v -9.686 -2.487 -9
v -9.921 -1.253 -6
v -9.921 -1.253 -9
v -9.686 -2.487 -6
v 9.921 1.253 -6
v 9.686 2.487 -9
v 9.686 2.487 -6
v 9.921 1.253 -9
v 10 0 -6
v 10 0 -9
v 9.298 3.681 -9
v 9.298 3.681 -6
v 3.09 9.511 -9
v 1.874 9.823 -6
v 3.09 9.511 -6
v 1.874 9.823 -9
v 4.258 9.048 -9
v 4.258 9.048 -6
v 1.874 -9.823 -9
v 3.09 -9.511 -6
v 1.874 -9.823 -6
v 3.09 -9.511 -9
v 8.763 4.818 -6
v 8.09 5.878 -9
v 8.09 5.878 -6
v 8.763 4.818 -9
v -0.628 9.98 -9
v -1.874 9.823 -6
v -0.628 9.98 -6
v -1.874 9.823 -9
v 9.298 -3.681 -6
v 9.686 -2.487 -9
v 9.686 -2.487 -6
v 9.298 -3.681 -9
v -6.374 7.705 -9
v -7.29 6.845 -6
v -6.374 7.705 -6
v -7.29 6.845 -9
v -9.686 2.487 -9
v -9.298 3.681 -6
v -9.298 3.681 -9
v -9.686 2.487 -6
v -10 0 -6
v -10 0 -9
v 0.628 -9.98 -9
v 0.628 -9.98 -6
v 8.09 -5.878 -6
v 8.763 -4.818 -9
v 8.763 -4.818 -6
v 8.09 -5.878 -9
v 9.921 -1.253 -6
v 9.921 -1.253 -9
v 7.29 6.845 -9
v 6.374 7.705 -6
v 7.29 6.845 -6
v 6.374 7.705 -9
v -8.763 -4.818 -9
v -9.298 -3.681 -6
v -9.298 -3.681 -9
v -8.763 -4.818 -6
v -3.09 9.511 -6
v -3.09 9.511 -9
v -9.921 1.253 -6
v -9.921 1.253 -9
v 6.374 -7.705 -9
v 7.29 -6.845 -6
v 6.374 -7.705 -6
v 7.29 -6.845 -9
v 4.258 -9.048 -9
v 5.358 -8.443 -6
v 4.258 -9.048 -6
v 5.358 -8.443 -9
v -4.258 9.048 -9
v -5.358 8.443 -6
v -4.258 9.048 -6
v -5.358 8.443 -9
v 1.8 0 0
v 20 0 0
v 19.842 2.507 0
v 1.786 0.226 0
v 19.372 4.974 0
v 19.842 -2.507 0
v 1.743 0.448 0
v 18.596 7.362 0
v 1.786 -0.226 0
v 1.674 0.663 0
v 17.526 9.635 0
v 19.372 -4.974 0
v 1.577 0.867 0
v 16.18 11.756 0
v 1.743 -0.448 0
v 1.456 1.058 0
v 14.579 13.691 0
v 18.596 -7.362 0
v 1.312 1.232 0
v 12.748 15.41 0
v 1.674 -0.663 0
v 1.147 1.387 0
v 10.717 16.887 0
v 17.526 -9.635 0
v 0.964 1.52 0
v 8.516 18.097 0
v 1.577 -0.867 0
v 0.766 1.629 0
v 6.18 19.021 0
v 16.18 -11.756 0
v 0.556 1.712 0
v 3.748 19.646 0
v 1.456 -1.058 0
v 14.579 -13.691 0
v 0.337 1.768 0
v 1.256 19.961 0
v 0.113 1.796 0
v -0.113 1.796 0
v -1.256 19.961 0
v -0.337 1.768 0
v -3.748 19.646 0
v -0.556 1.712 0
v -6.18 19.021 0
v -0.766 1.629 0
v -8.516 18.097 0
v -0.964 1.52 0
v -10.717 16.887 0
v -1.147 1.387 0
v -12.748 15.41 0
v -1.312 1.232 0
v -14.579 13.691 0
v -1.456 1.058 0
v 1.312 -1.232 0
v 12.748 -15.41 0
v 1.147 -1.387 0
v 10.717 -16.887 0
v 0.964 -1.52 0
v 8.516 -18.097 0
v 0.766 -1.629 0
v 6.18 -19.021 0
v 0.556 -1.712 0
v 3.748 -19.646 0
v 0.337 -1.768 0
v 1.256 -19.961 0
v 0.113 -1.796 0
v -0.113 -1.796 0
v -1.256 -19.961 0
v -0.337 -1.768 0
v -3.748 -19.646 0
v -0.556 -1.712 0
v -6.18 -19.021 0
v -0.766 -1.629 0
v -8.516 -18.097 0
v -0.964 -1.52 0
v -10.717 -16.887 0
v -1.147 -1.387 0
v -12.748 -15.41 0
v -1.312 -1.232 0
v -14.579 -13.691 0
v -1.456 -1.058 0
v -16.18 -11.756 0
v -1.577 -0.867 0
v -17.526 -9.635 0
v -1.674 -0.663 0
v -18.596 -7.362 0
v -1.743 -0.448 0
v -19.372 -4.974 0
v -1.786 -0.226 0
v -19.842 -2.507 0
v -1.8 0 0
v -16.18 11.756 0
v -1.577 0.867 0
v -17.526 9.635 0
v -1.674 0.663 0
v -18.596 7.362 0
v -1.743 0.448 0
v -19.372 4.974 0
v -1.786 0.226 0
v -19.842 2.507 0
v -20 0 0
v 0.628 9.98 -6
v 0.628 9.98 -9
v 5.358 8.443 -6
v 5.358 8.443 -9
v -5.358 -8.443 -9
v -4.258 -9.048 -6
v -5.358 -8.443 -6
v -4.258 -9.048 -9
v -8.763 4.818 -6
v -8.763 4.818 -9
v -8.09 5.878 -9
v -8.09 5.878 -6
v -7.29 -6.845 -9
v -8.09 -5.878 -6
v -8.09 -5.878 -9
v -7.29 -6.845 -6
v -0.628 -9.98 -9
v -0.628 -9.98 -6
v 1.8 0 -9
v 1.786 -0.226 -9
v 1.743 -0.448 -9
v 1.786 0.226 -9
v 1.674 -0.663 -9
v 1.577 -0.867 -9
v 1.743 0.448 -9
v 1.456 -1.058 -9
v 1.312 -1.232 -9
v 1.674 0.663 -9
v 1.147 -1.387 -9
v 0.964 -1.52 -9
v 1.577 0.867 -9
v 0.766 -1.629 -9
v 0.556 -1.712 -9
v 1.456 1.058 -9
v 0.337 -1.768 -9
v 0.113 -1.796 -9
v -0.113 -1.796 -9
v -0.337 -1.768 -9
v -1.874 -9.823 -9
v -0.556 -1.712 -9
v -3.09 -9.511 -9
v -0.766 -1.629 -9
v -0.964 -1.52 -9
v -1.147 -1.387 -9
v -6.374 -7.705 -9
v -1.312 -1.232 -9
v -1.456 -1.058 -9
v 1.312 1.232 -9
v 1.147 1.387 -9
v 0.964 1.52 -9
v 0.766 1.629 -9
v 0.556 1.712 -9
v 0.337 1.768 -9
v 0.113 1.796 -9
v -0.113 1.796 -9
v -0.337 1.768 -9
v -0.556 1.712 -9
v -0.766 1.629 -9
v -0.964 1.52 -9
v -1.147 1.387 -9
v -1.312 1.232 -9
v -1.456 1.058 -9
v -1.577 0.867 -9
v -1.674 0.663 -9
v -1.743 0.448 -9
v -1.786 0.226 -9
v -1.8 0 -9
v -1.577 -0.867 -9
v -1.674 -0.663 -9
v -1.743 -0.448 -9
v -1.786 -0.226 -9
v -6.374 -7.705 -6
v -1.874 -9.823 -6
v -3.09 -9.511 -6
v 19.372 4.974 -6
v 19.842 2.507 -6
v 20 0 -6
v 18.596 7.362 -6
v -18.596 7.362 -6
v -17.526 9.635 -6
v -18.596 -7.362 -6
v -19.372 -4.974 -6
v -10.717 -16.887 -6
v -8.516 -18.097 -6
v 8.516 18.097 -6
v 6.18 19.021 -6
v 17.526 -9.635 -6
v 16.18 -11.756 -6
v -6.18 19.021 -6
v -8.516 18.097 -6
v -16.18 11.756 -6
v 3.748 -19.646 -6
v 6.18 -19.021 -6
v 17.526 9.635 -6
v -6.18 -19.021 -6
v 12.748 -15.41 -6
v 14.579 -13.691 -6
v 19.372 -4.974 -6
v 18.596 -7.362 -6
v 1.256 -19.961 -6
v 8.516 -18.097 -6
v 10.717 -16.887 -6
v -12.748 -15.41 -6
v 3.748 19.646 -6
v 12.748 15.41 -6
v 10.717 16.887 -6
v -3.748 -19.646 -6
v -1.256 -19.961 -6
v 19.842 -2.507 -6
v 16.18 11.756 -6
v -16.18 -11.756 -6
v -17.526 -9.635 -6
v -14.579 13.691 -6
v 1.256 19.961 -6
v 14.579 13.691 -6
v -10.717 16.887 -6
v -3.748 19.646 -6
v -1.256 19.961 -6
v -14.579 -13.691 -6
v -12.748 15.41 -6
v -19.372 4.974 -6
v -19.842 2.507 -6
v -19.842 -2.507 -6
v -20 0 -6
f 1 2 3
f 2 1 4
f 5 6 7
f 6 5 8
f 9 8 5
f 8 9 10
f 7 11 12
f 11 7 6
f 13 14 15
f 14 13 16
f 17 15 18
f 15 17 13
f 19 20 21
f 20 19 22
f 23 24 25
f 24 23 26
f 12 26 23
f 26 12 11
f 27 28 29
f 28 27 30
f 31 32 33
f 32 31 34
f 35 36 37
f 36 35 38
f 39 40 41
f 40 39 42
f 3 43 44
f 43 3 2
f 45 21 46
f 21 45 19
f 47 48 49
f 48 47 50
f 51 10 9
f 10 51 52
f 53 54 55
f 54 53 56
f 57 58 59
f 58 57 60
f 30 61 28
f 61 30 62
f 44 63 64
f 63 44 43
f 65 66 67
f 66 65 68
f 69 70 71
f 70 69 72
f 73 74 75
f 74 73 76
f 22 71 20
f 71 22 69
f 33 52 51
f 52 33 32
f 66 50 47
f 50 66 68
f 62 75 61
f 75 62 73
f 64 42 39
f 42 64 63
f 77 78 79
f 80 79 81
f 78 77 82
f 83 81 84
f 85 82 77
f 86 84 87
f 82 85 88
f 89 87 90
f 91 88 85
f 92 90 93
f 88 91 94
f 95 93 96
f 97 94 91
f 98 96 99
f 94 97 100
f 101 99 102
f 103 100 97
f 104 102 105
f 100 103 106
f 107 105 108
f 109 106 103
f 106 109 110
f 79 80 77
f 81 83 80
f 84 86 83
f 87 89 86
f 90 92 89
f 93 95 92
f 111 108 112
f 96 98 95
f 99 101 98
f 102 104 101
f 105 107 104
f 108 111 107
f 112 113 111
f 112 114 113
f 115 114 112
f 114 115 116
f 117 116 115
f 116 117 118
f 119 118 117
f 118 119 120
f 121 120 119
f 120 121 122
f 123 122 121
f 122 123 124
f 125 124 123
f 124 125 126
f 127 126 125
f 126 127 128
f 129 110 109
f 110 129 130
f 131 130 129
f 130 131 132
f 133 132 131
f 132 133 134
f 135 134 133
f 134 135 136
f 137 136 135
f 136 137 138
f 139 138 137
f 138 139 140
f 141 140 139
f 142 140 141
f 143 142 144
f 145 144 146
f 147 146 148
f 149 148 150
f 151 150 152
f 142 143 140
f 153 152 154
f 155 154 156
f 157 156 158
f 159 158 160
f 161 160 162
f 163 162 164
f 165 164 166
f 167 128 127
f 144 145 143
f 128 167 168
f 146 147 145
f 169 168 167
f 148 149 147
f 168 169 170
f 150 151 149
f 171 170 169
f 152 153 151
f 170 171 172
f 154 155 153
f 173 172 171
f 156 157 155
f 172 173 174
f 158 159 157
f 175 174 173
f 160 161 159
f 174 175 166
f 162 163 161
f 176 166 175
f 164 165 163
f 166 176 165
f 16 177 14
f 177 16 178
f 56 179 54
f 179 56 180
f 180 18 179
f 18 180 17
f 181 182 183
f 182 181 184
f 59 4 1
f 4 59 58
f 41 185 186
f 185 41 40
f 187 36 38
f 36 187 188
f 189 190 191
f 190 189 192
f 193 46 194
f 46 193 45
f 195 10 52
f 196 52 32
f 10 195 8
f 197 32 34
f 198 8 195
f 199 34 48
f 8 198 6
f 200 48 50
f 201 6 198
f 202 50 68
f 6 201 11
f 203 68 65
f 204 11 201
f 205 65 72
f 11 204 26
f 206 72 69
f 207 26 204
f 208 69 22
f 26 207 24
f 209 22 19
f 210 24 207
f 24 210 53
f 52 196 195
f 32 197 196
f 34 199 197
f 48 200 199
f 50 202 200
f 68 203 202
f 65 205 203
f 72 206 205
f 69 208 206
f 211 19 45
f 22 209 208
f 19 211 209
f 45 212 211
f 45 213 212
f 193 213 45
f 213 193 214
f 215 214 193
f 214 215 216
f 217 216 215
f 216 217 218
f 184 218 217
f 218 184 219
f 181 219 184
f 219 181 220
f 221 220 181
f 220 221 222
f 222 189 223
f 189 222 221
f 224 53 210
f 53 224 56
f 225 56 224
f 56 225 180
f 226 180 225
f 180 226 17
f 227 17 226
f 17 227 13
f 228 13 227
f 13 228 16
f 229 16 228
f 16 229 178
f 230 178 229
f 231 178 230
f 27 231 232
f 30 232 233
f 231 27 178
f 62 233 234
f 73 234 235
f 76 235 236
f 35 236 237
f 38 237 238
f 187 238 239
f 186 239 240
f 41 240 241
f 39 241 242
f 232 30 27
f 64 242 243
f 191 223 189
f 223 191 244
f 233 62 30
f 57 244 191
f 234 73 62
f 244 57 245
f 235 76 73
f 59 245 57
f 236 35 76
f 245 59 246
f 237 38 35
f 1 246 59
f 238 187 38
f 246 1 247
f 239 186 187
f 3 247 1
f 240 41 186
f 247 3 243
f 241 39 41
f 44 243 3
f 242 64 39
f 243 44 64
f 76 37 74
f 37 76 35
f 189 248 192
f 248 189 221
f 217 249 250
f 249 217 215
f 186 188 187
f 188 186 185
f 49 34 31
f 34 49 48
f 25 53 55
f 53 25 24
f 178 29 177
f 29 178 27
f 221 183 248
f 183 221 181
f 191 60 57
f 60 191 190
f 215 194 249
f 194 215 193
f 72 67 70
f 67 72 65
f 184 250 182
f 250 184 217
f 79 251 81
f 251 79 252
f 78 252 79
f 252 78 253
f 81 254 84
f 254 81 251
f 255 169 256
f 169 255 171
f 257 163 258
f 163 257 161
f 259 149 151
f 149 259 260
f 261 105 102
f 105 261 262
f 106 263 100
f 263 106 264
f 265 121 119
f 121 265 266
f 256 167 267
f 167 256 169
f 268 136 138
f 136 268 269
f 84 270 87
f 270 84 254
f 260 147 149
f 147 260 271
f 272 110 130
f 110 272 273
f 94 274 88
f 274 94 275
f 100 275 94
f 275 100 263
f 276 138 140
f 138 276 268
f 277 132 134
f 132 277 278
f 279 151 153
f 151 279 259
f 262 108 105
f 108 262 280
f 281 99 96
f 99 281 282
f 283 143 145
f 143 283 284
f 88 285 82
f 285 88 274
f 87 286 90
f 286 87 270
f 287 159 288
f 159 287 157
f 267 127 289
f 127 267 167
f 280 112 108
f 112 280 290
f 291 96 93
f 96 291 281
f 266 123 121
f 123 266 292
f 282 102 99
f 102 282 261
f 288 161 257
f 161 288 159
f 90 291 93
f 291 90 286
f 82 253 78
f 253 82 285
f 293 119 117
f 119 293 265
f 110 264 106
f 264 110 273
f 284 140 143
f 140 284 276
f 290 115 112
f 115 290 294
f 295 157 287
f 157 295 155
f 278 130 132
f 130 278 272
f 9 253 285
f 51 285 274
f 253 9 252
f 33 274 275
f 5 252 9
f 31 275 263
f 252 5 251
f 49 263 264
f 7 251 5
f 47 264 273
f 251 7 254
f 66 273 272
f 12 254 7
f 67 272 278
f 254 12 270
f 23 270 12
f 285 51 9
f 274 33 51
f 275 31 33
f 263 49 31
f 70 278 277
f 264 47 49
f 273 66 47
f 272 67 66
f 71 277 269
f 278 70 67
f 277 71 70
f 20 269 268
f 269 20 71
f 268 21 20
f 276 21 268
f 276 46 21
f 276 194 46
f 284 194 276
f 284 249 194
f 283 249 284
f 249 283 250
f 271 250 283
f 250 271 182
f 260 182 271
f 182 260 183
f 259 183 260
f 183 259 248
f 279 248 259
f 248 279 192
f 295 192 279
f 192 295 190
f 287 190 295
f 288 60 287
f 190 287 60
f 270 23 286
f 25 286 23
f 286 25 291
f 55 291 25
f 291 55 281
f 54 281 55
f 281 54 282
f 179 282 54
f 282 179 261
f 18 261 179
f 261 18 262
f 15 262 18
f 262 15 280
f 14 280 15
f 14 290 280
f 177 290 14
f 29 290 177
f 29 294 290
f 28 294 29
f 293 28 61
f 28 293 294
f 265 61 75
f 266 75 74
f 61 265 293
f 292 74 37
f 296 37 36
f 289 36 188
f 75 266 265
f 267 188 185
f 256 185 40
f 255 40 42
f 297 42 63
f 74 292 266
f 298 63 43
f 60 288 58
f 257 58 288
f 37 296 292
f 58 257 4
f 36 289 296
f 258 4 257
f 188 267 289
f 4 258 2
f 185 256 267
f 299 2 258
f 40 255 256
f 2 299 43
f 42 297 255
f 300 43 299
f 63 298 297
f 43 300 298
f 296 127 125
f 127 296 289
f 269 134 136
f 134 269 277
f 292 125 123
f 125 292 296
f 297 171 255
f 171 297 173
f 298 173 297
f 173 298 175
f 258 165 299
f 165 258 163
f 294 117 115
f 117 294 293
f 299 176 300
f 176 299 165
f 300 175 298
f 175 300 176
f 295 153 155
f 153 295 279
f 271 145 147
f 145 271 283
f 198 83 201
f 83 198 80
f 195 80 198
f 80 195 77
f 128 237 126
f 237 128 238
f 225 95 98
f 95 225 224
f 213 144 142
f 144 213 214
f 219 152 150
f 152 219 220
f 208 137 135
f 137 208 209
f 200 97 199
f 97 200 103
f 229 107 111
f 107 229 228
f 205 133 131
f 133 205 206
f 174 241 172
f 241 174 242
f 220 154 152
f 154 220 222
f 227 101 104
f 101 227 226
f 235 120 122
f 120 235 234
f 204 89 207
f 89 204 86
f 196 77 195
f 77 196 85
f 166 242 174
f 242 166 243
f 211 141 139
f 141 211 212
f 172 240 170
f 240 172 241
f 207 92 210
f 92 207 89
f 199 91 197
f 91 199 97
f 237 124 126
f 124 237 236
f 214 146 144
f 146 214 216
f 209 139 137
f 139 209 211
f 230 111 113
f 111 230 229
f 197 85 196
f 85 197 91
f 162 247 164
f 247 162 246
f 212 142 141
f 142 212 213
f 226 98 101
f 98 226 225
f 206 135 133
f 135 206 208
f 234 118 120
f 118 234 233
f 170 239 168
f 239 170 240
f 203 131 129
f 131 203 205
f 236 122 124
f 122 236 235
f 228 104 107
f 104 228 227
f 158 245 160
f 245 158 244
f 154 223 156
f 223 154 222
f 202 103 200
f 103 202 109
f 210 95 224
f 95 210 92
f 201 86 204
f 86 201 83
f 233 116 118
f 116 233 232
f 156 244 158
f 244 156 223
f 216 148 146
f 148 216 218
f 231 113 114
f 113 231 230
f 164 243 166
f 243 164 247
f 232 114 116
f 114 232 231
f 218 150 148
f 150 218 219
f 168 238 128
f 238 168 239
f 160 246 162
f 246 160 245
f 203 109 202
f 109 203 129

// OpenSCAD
$fn = 50;


difference() {
	union() {
		translate(v = [0, 0, -9.0000000000]) {
			cylinder(h = 9, r = 10.0000000000);
		}
		translate(v = [0, 0, -6.0000000000]) {
			cylinder(h = 6, r = 20.0000000000);
		}
	}
	union() {
		#translate(v = [0, 0, -9]) {
			cylinder(h = 9, r = 1.8000000000);
		}
	}
}
